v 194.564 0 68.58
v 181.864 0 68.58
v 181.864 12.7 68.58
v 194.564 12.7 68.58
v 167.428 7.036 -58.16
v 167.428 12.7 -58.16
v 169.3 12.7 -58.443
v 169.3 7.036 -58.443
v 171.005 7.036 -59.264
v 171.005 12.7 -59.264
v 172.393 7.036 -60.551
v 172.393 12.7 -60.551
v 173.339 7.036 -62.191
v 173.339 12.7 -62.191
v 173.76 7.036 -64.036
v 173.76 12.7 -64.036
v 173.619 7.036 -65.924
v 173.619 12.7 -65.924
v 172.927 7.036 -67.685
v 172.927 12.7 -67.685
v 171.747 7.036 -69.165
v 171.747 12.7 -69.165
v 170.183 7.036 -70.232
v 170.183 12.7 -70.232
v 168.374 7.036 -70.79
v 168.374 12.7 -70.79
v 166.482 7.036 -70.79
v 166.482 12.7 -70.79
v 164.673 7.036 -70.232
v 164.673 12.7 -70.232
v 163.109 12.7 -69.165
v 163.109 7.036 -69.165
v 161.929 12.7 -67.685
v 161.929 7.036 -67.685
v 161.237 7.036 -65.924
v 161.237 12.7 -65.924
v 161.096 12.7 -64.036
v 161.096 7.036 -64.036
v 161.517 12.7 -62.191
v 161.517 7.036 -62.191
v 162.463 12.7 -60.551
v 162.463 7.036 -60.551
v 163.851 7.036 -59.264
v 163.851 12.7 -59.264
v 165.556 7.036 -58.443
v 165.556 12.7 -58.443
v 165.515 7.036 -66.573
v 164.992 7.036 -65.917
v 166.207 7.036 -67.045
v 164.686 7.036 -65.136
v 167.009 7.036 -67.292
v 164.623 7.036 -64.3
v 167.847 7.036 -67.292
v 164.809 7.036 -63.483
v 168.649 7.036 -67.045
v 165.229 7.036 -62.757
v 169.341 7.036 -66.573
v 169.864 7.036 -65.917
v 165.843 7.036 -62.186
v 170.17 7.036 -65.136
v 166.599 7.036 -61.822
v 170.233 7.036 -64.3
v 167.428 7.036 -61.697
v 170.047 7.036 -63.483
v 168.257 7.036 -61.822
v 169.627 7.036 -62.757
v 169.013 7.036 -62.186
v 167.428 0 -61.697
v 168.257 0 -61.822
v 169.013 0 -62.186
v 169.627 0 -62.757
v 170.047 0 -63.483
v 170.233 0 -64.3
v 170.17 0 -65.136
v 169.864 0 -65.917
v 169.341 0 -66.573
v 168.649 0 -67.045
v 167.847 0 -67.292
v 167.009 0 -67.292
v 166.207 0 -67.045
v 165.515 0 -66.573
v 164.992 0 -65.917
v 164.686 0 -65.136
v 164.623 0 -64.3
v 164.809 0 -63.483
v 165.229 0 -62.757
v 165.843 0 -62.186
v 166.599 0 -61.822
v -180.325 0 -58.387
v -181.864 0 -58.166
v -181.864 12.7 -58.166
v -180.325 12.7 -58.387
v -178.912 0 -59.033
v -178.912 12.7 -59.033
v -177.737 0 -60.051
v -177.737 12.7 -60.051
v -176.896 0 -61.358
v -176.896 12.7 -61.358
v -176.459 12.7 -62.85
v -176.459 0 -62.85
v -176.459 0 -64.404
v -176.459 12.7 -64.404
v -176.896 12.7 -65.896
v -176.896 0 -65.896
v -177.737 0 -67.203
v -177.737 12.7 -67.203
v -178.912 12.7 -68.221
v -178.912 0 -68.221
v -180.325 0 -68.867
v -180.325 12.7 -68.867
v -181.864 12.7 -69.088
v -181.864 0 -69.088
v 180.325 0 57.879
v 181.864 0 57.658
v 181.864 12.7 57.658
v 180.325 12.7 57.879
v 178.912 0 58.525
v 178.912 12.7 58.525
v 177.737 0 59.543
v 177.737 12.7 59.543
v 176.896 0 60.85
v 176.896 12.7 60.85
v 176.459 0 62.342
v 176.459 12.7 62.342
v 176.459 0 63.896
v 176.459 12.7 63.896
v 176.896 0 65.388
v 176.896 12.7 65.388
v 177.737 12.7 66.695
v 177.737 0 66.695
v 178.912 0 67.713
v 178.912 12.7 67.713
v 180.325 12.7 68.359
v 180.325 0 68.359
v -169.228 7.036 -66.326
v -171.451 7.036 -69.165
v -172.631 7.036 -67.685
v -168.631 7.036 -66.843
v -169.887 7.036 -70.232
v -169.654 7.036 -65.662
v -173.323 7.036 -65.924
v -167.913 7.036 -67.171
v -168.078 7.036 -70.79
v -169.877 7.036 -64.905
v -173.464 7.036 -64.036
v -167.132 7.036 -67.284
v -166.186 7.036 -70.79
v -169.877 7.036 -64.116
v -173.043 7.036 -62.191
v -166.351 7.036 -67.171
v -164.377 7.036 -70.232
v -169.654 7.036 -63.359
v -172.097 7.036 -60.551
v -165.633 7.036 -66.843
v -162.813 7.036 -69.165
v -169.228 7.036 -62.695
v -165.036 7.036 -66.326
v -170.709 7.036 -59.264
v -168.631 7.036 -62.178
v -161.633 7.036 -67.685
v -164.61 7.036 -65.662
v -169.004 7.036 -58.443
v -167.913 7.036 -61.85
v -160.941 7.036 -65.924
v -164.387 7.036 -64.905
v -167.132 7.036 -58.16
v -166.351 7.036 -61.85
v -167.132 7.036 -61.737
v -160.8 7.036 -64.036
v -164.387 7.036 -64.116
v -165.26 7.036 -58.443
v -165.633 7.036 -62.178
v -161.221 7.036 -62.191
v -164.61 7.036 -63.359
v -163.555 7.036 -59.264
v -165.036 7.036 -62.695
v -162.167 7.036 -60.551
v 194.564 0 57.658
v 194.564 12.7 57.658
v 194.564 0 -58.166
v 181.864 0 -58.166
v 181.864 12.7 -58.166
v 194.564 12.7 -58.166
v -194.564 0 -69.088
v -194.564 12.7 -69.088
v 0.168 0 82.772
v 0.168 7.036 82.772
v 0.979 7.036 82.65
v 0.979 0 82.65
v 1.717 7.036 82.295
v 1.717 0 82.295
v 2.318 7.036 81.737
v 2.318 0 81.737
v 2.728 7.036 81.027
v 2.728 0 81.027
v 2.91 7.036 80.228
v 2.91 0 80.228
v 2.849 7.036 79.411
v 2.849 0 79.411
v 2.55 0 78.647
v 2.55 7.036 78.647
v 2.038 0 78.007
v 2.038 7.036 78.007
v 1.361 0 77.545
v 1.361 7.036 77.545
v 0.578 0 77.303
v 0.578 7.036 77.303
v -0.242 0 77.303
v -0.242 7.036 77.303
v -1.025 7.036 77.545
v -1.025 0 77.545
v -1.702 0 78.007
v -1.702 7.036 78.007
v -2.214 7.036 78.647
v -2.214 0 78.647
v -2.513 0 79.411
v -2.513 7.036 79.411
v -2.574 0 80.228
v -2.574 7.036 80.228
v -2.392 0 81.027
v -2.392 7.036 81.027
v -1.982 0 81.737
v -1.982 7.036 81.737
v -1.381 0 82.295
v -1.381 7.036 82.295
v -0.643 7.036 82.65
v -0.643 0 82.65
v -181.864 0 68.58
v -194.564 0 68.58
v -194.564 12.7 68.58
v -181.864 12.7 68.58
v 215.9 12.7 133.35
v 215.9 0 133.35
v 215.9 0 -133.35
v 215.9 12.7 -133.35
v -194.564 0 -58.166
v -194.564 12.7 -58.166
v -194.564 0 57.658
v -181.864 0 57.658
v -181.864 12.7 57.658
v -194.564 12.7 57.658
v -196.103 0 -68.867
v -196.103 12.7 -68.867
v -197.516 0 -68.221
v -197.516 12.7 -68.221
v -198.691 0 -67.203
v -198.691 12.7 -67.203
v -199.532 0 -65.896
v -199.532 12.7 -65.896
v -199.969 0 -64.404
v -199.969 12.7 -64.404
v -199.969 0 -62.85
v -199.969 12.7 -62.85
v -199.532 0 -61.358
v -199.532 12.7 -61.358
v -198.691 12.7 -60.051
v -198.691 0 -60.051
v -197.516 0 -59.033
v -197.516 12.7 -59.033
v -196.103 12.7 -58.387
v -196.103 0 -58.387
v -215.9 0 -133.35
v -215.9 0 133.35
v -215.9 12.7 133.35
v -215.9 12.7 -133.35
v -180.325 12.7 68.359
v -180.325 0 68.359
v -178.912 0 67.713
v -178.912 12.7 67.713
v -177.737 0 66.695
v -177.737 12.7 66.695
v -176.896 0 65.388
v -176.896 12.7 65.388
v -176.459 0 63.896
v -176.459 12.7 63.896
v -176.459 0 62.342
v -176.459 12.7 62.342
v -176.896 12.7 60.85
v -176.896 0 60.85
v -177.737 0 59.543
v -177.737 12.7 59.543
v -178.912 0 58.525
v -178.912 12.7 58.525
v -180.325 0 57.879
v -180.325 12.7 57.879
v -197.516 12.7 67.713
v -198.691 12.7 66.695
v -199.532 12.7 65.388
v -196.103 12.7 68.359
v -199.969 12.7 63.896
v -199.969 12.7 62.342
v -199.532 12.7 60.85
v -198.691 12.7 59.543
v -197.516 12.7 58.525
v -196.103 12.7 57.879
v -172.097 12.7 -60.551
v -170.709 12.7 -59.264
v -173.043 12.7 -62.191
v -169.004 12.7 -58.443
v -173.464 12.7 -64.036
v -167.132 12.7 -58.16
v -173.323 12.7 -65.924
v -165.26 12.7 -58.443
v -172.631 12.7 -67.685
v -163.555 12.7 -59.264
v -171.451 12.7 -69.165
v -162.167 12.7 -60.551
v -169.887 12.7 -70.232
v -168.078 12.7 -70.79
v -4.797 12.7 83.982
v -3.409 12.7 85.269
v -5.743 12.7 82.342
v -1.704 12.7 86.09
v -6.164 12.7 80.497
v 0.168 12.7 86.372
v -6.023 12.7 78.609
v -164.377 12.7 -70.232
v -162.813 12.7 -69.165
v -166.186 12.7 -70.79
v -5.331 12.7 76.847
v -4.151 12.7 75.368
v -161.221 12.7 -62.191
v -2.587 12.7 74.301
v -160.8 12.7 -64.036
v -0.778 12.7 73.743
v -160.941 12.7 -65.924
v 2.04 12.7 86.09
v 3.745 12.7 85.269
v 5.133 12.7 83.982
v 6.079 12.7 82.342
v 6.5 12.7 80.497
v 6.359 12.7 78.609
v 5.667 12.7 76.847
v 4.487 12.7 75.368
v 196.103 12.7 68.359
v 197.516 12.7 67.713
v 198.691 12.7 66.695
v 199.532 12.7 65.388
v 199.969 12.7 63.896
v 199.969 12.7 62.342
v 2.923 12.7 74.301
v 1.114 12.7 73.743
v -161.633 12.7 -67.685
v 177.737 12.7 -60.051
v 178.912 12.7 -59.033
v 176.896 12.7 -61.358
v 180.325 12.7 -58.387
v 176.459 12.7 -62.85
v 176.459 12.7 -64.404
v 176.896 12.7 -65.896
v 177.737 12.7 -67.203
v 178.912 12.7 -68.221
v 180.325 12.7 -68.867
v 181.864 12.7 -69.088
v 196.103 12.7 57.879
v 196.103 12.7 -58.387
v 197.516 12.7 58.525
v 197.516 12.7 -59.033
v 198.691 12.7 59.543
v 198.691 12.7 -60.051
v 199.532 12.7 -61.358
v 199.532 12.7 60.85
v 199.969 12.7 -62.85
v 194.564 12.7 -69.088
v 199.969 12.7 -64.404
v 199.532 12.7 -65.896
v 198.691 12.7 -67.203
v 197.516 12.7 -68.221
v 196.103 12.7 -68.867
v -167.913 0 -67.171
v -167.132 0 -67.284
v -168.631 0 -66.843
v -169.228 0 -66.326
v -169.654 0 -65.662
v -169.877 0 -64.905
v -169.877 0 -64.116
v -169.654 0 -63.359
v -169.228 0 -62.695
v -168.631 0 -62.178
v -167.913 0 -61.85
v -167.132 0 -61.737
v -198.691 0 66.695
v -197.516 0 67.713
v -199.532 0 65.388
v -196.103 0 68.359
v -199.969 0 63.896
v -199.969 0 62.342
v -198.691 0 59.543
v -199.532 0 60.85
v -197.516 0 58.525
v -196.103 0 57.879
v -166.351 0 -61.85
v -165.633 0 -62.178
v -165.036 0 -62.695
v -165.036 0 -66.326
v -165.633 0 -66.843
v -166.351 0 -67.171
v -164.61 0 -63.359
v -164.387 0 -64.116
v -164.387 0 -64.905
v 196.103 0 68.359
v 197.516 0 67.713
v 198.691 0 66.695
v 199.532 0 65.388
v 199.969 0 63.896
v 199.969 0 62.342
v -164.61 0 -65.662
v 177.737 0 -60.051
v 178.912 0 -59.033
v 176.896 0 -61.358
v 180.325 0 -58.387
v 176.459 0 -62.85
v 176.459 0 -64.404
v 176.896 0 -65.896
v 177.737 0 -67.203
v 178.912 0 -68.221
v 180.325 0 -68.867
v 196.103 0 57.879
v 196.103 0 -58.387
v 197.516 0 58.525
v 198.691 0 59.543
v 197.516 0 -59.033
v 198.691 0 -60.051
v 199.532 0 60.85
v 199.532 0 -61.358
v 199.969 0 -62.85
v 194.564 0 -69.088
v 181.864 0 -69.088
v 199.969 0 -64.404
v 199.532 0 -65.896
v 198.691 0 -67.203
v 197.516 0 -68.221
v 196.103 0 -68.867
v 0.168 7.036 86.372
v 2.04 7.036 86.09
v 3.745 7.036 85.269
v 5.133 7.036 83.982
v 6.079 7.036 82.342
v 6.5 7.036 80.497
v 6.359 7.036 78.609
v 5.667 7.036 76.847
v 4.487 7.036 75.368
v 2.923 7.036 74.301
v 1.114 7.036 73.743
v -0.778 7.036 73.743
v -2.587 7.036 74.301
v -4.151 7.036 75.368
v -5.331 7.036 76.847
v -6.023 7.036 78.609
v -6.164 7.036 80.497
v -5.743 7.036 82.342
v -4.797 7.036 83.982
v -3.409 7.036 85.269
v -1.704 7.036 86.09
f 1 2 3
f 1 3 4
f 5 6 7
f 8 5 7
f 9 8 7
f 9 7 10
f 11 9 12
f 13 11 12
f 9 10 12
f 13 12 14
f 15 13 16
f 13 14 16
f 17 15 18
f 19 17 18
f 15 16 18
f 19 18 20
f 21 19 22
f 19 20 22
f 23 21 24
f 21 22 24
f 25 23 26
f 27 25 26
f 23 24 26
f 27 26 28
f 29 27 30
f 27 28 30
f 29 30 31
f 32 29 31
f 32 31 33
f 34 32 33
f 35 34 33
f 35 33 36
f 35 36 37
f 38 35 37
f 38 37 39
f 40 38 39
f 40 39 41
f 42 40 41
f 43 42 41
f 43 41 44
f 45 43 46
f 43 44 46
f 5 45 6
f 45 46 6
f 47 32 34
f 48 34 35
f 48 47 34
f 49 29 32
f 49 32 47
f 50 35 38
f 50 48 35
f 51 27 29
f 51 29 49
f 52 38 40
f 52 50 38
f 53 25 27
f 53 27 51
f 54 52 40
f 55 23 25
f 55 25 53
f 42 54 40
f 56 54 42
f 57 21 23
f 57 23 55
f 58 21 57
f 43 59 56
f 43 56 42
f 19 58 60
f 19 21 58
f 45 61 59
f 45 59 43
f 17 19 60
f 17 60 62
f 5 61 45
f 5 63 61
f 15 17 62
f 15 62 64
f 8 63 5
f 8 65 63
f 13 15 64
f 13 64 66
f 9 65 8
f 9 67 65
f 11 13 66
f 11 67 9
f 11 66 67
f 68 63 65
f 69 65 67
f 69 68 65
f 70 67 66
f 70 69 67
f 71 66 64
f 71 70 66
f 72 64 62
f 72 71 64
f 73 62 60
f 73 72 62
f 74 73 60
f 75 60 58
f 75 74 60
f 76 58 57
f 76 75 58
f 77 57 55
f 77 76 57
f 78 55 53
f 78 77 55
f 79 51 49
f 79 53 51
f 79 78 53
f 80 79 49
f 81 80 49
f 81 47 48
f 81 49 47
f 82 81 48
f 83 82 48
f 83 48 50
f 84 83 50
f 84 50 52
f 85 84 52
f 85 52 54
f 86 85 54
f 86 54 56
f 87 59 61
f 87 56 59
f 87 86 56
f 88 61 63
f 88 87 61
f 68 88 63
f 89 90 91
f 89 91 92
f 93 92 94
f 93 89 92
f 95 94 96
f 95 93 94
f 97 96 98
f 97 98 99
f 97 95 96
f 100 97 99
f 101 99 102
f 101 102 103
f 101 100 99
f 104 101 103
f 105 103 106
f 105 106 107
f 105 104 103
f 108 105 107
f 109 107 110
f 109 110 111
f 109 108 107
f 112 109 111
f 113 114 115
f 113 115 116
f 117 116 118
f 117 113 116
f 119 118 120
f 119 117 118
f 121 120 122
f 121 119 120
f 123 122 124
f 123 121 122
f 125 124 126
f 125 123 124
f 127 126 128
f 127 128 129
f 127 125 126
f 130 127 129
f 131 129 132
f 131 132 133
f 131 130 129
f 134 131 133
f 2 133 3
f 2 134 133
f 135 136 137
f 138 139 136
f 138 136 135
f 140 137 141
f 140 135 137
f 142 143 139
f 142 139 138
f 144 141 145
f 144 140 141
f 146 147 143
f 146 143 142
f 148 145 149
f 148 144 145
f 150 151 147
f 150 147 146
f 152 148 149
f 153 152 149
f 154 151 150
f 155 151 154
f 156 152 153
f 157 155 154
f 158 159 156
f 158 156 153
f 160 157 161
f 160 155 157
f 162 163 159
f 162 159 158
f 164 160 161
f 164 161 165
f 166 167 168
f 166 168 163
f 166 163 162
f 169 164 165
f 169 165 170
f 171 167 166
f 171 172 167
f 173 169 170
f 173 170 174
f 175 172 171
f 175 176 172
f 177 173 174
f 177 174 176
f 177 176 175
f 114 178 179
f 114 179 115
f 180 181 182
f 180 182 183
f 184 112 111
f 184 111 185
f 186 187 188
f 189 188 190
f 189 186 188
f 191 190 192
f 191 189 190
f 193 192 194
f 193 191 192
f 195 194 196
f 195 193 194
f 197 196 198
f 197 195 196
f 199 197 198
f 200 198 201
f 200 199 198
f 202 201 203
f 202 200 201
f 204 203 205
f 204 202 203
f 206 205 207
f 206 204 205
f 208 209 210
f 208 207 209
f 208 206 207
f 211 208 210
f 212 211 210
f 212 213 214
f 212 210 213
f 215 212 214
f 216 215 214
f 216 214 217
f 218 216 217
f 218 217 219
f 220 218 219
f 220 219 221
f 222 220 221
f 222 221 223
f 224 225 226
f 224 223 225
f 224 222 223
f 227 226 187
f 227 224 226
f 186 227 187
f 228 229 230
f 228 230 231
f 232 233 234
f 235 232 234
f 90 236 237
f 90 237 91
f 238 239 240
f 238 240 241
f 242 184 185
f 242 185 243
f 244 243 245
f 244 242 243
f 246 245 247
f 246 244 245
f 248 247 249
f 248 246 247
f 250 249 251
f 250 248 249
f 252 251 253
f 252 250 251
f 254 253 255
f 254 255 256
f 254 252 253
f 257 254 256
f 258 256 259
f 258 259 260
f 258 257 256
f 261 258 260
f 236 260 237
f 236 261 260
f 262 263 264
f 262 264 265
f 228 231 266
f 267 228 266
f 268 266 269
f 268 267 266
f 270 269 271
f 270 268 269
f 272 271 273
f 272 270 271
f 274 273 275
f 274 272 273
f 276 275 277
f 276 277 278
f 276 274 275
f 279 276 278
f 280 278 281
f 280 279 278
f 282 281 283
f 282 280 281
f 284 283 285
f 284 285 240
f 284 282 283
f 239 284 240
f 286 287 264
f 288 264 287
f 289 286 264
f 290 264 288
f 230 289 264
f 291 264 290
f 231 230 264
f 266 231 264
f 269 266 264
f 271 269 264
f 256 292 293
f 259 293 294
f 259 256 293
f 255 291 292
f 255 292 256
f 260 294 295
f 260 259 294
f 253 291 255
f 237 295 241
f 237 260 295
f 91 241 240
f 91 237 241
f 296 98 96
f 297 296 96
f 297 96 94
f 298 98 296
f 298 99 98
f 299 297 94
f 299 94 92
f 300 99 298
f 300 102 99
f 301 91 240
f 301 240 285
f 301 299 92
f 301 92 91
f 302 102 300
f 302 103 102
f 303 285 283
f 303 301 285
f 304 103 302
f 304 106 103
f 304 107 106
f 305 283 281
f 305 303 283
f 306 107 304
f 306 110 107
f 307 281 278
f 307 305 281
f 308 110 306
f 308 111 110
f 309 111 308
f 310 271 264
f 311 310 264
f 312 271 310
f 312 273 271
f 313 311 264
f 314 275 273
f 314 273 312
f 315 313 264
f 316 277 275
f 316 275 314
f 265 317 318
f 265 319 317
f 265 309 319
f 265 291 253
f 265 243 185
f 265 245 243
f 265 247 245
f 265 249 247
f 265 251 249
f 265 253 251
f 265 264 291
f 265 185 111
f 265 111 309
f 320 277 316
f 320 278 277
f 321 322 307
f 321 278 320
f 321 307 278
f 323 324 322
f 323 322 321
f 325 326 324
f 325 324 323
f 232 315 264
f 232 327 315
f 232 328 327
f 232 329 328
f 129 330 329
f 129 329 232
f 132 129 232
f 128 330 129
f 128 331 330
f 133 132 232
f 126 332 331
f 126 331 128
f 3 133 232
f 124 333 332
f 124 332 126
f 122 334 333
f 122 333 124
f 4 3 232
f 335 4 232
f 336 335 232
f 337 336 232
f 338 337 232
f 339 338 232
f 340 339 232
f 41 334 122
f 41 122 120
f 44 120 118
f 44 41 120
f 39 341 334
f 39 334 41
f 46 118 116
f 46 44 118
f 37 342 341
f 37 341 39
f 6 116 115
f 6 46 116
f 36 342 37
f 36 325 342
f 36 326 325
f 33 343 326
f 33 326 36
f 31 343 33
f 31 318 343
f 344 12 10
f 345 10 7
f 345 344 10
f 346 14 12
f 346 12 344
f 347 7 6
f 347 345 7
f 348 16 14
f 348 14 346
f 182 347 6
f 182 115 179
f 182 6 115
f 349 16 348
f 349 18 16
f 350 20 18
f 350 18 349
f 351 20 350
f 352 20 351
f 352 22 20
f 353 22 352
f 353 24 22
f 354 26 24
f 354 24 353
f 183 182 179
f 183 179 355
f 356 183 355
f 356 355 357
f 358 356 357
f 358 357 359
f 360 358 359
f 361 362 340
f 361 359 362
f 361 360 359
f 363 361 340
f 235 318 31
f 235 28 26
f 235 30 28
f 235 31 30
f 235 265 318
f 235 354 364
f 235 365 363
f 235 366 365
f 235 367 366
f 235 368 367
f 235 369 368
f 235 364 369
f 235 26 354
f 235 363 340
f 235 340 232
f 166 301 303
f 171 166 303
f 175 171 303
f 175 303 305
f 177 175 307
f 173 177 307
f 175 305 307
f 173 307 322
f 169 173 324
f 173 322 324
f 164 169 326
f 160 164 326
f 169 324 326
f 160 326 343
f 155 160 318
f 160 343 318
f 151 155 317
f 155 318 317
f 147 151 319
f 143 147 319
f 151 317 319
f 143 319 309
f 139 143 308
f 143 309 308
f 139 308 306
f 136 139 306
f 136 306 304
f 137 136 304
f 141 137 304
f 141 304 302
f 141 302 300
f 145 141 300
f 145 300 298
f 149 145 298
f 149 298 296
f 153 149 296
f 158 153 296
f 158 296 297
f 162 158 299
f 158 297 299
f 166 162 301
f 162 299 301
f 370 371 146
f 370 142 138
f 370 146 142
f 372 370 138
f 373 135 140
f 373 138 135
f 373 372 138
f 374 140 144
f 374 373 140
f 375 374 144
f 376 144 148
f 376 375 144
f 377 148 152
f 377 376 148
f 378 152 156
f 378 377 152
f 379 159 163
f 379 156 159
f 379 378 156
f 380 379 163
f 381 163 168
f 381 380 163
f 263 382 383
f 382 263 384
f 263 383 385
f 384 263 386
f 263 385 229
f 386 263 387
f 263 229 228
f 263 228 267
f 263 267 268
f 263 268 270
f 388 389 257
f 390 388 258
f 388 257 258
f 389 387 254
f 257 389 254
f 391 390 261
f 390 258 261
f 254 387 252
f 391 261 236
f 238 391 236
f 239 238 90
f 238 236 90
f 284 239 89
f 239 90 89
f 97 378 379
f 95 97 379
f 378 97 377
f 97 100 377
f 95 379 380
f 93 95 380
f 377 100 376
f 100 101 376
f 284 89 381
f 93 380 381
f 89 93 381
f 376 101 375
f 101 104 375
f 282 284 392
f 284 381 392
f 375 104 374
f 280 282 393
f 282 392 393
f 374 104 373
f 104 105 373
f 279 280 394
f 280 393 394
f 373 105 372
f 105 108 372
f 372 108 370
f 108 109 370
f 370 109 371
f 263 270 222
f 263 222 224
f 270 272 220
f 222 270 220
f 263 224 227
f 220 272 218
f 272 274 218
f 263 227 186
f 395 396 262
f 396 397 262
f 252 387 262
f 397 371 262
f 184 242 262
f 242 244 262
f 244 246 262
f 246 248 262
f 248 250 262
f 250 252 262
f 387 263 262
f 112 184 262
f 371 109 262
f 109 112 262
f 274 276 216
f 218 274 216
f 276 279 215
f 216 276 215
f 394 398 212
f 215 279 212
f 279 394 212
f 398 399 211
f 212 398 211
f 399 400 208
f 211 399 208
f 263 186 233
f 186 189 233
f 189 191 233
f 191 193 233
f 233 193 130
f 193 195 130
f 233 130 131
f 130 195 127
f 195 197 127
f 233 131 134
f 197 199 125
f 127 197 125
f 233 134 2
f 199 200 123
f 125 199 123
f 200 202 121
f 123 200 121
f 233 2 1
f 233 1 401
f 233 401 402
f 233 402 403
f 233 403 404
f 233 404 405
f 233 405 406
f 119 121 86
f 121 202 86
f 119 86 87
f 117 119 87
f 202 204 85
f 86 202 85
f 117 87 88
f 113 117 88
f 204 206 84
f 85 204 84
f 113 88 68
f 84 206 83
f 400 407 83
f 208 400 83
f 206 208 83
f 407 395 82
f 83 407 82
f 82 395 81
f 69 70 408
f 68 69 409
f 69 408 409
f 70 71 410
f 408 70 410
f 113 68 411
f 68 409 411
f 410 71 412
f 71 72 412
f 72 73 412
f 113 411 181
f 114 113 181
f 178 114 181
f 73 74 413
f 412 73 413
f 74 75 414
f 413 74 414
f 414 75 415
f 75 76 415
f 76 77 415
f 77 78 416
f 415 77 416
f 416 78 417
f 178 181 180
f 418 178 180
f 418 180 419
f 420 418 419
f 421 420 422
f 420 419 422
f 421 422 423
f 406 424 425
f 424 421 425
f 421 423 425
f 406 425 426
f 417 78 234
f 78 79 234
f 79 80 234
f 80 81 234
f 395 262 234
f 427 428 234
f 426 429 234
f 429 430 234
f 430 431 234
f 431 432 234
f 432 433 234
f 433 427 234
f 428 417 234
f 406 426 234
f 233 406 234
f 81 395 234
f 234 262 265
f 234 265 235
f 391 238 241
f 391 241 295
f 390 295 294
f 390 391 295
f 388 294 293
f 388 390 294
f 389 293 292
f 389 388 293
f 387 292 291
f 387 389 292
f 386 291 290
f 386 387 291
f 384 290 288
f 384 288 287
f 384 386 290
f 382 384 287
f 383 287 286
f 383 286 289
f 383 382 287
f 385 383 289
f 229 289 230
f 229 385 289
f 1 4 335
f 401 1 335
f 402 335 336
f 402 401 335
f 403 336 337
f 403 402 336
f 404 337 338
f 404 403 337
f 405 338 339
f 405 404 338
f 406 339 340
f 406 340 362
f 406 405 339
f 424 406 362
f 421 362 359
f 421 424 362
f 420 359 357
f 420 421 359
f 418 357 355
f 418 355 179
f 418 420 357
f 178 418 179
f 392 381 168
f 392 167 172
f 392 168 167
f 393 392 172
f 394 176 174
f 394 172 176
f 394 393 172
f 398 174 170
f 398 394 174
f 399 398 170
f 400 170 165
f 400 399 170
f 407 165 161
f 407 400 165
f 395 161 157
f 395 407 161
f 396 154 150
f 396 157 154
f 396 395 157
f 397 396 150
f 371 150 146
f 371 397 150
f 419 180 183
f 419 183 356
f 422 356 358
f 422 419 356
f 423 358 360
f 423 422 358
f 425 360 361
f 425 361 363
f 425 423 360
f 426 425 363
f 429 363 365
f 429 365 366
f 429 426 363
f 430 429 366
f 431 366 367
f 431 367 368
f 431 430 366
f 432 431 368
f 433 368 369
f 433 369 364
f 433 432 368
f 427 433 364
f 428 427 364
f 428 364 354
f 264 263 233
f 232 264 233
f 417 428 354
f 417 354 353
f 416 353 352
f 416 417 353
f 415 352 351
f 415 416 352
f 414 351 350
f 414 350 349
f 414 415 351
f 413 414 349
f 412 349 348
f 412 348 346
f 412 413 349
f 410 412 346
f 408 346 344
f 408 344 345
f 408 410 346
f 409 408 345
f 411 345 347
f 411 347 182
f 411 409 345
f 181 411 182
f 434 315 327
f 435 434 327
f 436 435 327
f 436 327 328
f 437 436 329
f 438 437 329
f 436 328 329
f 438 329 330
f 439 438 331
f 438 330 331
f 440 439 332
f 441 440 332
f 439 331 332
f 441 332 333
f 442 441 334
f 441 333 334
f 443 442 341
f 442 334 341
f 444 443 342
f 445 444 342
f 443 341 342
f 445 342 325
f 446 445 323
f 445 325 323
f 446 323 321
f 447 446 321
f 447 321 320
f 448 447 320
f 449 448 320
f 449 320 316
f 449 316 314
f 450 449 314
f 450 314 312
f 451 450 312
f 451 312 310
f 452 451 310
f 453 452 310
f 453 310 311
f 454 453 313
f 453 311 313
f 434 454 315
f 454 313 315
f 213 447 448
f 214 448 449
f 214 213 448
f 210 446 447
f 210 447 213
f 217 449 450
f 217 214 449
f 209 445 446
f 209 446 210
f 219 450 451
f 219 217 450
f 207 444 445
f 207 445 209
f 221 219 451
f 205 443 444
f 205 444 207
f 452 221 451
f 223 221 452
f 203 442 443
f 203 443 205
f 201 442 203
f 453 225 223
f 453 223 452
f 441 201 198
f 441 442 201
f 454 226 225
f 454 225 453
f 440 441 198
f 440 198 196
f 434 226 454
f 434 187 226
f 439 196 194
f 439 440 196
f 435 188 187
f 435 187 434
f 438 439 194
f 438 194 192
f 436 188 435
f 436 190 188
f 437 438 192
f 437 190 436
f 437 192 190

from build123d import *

# Parameters (mm, degrees)
SKETCH1_W      = 431.8
SKETCH1_H      = 266.7
EXTRUDE1_DEPTH = 12.7
SKETCH2_R      = 6.35
EXTRUDE2_DEPTH = 5.6642


with BuildPart() as part:
    # Sketch1 → Extrude1 (new body)
    with BuildSketch(Plane(origin=(0, 0, 0), x_dir=(1, 0, 0), z_dir=(0, 1, 0))):
        Rectangle(SKETCH1_W, SKETCH1_H)
        with BuildLine():
            Line((-194.564000001, 58.166), (-181.864, 58.166))
            ThreePointArc((-181.864, 58.166), (-176.403, 63.627), (-181.864, 69.088))
            Line((-181.864, 69.088), (-194.564, 69.088))
            ThreePointArc((-194.564, 69.088), (-200.025, 63.627000001), (-194.564000001, 58.166))
        make_face(mode=Mode.SUBTRACT)
        with BuildLine():
            Line((-181.864, -57.658), (-194.564, -57.658))
            ThreePointArc((-194.564, -57.658), (-200.025, -63.119), (-194.564000001, -68.58))
            Line((-194.564000001, -68.58), (-181.864, -68.58))
            ThreePointArc((-181.864, -68.58), (-176.403, -63.119), (-181.864, -57.658))
        make_face(mode=Mode.SUBTRACT)
        with BuildLine():
            Line((194.564, 69.088), (181.864, 69.088))
            ThreePointArc((181.864, 69.088), (176.403, 63.627), (181.864, 58.166))
            Line((181.864, 58.166), (194.564, 58.166))
            ThreePointArc((194.564, 58.166), (200.025, 63.627), (194.564, 69.088))
        make_face(mode=Mode.SUBTRACT)
        with BuildLine():
            Line((181.863999999, -68.58), (194.564, -68.58))
            ThreePointArc((194.564, -68.58), (200.025, -63.119), (194.564, -57.658))
            Line((194.564, -57.658), (181.864, -57.658))
            ThreePointArc((181.864, -57.658), (176.403, -63.118999999), (181.863999999, -68.58))
        make_face(mode=Mode.SUBTRACT)
        with BuildLine():
            ThreePointArc((-167.131999747, 67.283526113), (-169.905025875, 64.510499985), (-167.131999746, 61.737473858))
            ThreePointArc((-167.131999746, 61.737473858), (-164.358973618, 64.510499986), (-167.131999747, 67.283526113))
        make_face(mode=Mode.SUBTRACT)
        with BuildLine():
            ThreePointArc((0.167999917, -77.272489219), (-2.582000069, -80.022489206), (0.167999918, -82.772489192))
            ThreePointArc((0.167999918, -82.772489192), (2.917999904, -80.022489205), (0.167999917, -77.272489219))
        make_face(mode=Mode.SUBTRACT)
        with BuildLine():
            ThreePointArc((167.427999991, 67.323527583), (164.614972394, 64.510499985), (167.427999992, 61.697472388))
            ThreePointArc((167.427999992, 61.697472388), (170.241027589, 64.510499986), (167.427999991, 67.323527583))
        make_face(mode=Mode.SUBTRACT)
    extrude(amount=EXTRUDE1_DEPTH)

    # Sketch2 → Extrude2 (cut)
    with BuildSketch(Plane(origin=(0, 12.7, 0), x_dir=(1, 0, 0), z_dir=(0, 1, 0))):
        with Locations(Location((-167.131999747, 64.510499986, 0), (0, 0, 270))):
            Circle(SKETCH2_R)
        with Locations(Location((0.167999917, -80.022489205, 0), (0, 0, 270))):
            Circle(SKETCH2_R)
        with Locations(Location((167.427999991, 64.510499986, 0), (0, 0, 270))):
            Circle(SKETCH2_R)
    extrude(amount=-EXTRUDE2_DEPTH, mode=Mode.SUBTRACT)


solid = part.part
